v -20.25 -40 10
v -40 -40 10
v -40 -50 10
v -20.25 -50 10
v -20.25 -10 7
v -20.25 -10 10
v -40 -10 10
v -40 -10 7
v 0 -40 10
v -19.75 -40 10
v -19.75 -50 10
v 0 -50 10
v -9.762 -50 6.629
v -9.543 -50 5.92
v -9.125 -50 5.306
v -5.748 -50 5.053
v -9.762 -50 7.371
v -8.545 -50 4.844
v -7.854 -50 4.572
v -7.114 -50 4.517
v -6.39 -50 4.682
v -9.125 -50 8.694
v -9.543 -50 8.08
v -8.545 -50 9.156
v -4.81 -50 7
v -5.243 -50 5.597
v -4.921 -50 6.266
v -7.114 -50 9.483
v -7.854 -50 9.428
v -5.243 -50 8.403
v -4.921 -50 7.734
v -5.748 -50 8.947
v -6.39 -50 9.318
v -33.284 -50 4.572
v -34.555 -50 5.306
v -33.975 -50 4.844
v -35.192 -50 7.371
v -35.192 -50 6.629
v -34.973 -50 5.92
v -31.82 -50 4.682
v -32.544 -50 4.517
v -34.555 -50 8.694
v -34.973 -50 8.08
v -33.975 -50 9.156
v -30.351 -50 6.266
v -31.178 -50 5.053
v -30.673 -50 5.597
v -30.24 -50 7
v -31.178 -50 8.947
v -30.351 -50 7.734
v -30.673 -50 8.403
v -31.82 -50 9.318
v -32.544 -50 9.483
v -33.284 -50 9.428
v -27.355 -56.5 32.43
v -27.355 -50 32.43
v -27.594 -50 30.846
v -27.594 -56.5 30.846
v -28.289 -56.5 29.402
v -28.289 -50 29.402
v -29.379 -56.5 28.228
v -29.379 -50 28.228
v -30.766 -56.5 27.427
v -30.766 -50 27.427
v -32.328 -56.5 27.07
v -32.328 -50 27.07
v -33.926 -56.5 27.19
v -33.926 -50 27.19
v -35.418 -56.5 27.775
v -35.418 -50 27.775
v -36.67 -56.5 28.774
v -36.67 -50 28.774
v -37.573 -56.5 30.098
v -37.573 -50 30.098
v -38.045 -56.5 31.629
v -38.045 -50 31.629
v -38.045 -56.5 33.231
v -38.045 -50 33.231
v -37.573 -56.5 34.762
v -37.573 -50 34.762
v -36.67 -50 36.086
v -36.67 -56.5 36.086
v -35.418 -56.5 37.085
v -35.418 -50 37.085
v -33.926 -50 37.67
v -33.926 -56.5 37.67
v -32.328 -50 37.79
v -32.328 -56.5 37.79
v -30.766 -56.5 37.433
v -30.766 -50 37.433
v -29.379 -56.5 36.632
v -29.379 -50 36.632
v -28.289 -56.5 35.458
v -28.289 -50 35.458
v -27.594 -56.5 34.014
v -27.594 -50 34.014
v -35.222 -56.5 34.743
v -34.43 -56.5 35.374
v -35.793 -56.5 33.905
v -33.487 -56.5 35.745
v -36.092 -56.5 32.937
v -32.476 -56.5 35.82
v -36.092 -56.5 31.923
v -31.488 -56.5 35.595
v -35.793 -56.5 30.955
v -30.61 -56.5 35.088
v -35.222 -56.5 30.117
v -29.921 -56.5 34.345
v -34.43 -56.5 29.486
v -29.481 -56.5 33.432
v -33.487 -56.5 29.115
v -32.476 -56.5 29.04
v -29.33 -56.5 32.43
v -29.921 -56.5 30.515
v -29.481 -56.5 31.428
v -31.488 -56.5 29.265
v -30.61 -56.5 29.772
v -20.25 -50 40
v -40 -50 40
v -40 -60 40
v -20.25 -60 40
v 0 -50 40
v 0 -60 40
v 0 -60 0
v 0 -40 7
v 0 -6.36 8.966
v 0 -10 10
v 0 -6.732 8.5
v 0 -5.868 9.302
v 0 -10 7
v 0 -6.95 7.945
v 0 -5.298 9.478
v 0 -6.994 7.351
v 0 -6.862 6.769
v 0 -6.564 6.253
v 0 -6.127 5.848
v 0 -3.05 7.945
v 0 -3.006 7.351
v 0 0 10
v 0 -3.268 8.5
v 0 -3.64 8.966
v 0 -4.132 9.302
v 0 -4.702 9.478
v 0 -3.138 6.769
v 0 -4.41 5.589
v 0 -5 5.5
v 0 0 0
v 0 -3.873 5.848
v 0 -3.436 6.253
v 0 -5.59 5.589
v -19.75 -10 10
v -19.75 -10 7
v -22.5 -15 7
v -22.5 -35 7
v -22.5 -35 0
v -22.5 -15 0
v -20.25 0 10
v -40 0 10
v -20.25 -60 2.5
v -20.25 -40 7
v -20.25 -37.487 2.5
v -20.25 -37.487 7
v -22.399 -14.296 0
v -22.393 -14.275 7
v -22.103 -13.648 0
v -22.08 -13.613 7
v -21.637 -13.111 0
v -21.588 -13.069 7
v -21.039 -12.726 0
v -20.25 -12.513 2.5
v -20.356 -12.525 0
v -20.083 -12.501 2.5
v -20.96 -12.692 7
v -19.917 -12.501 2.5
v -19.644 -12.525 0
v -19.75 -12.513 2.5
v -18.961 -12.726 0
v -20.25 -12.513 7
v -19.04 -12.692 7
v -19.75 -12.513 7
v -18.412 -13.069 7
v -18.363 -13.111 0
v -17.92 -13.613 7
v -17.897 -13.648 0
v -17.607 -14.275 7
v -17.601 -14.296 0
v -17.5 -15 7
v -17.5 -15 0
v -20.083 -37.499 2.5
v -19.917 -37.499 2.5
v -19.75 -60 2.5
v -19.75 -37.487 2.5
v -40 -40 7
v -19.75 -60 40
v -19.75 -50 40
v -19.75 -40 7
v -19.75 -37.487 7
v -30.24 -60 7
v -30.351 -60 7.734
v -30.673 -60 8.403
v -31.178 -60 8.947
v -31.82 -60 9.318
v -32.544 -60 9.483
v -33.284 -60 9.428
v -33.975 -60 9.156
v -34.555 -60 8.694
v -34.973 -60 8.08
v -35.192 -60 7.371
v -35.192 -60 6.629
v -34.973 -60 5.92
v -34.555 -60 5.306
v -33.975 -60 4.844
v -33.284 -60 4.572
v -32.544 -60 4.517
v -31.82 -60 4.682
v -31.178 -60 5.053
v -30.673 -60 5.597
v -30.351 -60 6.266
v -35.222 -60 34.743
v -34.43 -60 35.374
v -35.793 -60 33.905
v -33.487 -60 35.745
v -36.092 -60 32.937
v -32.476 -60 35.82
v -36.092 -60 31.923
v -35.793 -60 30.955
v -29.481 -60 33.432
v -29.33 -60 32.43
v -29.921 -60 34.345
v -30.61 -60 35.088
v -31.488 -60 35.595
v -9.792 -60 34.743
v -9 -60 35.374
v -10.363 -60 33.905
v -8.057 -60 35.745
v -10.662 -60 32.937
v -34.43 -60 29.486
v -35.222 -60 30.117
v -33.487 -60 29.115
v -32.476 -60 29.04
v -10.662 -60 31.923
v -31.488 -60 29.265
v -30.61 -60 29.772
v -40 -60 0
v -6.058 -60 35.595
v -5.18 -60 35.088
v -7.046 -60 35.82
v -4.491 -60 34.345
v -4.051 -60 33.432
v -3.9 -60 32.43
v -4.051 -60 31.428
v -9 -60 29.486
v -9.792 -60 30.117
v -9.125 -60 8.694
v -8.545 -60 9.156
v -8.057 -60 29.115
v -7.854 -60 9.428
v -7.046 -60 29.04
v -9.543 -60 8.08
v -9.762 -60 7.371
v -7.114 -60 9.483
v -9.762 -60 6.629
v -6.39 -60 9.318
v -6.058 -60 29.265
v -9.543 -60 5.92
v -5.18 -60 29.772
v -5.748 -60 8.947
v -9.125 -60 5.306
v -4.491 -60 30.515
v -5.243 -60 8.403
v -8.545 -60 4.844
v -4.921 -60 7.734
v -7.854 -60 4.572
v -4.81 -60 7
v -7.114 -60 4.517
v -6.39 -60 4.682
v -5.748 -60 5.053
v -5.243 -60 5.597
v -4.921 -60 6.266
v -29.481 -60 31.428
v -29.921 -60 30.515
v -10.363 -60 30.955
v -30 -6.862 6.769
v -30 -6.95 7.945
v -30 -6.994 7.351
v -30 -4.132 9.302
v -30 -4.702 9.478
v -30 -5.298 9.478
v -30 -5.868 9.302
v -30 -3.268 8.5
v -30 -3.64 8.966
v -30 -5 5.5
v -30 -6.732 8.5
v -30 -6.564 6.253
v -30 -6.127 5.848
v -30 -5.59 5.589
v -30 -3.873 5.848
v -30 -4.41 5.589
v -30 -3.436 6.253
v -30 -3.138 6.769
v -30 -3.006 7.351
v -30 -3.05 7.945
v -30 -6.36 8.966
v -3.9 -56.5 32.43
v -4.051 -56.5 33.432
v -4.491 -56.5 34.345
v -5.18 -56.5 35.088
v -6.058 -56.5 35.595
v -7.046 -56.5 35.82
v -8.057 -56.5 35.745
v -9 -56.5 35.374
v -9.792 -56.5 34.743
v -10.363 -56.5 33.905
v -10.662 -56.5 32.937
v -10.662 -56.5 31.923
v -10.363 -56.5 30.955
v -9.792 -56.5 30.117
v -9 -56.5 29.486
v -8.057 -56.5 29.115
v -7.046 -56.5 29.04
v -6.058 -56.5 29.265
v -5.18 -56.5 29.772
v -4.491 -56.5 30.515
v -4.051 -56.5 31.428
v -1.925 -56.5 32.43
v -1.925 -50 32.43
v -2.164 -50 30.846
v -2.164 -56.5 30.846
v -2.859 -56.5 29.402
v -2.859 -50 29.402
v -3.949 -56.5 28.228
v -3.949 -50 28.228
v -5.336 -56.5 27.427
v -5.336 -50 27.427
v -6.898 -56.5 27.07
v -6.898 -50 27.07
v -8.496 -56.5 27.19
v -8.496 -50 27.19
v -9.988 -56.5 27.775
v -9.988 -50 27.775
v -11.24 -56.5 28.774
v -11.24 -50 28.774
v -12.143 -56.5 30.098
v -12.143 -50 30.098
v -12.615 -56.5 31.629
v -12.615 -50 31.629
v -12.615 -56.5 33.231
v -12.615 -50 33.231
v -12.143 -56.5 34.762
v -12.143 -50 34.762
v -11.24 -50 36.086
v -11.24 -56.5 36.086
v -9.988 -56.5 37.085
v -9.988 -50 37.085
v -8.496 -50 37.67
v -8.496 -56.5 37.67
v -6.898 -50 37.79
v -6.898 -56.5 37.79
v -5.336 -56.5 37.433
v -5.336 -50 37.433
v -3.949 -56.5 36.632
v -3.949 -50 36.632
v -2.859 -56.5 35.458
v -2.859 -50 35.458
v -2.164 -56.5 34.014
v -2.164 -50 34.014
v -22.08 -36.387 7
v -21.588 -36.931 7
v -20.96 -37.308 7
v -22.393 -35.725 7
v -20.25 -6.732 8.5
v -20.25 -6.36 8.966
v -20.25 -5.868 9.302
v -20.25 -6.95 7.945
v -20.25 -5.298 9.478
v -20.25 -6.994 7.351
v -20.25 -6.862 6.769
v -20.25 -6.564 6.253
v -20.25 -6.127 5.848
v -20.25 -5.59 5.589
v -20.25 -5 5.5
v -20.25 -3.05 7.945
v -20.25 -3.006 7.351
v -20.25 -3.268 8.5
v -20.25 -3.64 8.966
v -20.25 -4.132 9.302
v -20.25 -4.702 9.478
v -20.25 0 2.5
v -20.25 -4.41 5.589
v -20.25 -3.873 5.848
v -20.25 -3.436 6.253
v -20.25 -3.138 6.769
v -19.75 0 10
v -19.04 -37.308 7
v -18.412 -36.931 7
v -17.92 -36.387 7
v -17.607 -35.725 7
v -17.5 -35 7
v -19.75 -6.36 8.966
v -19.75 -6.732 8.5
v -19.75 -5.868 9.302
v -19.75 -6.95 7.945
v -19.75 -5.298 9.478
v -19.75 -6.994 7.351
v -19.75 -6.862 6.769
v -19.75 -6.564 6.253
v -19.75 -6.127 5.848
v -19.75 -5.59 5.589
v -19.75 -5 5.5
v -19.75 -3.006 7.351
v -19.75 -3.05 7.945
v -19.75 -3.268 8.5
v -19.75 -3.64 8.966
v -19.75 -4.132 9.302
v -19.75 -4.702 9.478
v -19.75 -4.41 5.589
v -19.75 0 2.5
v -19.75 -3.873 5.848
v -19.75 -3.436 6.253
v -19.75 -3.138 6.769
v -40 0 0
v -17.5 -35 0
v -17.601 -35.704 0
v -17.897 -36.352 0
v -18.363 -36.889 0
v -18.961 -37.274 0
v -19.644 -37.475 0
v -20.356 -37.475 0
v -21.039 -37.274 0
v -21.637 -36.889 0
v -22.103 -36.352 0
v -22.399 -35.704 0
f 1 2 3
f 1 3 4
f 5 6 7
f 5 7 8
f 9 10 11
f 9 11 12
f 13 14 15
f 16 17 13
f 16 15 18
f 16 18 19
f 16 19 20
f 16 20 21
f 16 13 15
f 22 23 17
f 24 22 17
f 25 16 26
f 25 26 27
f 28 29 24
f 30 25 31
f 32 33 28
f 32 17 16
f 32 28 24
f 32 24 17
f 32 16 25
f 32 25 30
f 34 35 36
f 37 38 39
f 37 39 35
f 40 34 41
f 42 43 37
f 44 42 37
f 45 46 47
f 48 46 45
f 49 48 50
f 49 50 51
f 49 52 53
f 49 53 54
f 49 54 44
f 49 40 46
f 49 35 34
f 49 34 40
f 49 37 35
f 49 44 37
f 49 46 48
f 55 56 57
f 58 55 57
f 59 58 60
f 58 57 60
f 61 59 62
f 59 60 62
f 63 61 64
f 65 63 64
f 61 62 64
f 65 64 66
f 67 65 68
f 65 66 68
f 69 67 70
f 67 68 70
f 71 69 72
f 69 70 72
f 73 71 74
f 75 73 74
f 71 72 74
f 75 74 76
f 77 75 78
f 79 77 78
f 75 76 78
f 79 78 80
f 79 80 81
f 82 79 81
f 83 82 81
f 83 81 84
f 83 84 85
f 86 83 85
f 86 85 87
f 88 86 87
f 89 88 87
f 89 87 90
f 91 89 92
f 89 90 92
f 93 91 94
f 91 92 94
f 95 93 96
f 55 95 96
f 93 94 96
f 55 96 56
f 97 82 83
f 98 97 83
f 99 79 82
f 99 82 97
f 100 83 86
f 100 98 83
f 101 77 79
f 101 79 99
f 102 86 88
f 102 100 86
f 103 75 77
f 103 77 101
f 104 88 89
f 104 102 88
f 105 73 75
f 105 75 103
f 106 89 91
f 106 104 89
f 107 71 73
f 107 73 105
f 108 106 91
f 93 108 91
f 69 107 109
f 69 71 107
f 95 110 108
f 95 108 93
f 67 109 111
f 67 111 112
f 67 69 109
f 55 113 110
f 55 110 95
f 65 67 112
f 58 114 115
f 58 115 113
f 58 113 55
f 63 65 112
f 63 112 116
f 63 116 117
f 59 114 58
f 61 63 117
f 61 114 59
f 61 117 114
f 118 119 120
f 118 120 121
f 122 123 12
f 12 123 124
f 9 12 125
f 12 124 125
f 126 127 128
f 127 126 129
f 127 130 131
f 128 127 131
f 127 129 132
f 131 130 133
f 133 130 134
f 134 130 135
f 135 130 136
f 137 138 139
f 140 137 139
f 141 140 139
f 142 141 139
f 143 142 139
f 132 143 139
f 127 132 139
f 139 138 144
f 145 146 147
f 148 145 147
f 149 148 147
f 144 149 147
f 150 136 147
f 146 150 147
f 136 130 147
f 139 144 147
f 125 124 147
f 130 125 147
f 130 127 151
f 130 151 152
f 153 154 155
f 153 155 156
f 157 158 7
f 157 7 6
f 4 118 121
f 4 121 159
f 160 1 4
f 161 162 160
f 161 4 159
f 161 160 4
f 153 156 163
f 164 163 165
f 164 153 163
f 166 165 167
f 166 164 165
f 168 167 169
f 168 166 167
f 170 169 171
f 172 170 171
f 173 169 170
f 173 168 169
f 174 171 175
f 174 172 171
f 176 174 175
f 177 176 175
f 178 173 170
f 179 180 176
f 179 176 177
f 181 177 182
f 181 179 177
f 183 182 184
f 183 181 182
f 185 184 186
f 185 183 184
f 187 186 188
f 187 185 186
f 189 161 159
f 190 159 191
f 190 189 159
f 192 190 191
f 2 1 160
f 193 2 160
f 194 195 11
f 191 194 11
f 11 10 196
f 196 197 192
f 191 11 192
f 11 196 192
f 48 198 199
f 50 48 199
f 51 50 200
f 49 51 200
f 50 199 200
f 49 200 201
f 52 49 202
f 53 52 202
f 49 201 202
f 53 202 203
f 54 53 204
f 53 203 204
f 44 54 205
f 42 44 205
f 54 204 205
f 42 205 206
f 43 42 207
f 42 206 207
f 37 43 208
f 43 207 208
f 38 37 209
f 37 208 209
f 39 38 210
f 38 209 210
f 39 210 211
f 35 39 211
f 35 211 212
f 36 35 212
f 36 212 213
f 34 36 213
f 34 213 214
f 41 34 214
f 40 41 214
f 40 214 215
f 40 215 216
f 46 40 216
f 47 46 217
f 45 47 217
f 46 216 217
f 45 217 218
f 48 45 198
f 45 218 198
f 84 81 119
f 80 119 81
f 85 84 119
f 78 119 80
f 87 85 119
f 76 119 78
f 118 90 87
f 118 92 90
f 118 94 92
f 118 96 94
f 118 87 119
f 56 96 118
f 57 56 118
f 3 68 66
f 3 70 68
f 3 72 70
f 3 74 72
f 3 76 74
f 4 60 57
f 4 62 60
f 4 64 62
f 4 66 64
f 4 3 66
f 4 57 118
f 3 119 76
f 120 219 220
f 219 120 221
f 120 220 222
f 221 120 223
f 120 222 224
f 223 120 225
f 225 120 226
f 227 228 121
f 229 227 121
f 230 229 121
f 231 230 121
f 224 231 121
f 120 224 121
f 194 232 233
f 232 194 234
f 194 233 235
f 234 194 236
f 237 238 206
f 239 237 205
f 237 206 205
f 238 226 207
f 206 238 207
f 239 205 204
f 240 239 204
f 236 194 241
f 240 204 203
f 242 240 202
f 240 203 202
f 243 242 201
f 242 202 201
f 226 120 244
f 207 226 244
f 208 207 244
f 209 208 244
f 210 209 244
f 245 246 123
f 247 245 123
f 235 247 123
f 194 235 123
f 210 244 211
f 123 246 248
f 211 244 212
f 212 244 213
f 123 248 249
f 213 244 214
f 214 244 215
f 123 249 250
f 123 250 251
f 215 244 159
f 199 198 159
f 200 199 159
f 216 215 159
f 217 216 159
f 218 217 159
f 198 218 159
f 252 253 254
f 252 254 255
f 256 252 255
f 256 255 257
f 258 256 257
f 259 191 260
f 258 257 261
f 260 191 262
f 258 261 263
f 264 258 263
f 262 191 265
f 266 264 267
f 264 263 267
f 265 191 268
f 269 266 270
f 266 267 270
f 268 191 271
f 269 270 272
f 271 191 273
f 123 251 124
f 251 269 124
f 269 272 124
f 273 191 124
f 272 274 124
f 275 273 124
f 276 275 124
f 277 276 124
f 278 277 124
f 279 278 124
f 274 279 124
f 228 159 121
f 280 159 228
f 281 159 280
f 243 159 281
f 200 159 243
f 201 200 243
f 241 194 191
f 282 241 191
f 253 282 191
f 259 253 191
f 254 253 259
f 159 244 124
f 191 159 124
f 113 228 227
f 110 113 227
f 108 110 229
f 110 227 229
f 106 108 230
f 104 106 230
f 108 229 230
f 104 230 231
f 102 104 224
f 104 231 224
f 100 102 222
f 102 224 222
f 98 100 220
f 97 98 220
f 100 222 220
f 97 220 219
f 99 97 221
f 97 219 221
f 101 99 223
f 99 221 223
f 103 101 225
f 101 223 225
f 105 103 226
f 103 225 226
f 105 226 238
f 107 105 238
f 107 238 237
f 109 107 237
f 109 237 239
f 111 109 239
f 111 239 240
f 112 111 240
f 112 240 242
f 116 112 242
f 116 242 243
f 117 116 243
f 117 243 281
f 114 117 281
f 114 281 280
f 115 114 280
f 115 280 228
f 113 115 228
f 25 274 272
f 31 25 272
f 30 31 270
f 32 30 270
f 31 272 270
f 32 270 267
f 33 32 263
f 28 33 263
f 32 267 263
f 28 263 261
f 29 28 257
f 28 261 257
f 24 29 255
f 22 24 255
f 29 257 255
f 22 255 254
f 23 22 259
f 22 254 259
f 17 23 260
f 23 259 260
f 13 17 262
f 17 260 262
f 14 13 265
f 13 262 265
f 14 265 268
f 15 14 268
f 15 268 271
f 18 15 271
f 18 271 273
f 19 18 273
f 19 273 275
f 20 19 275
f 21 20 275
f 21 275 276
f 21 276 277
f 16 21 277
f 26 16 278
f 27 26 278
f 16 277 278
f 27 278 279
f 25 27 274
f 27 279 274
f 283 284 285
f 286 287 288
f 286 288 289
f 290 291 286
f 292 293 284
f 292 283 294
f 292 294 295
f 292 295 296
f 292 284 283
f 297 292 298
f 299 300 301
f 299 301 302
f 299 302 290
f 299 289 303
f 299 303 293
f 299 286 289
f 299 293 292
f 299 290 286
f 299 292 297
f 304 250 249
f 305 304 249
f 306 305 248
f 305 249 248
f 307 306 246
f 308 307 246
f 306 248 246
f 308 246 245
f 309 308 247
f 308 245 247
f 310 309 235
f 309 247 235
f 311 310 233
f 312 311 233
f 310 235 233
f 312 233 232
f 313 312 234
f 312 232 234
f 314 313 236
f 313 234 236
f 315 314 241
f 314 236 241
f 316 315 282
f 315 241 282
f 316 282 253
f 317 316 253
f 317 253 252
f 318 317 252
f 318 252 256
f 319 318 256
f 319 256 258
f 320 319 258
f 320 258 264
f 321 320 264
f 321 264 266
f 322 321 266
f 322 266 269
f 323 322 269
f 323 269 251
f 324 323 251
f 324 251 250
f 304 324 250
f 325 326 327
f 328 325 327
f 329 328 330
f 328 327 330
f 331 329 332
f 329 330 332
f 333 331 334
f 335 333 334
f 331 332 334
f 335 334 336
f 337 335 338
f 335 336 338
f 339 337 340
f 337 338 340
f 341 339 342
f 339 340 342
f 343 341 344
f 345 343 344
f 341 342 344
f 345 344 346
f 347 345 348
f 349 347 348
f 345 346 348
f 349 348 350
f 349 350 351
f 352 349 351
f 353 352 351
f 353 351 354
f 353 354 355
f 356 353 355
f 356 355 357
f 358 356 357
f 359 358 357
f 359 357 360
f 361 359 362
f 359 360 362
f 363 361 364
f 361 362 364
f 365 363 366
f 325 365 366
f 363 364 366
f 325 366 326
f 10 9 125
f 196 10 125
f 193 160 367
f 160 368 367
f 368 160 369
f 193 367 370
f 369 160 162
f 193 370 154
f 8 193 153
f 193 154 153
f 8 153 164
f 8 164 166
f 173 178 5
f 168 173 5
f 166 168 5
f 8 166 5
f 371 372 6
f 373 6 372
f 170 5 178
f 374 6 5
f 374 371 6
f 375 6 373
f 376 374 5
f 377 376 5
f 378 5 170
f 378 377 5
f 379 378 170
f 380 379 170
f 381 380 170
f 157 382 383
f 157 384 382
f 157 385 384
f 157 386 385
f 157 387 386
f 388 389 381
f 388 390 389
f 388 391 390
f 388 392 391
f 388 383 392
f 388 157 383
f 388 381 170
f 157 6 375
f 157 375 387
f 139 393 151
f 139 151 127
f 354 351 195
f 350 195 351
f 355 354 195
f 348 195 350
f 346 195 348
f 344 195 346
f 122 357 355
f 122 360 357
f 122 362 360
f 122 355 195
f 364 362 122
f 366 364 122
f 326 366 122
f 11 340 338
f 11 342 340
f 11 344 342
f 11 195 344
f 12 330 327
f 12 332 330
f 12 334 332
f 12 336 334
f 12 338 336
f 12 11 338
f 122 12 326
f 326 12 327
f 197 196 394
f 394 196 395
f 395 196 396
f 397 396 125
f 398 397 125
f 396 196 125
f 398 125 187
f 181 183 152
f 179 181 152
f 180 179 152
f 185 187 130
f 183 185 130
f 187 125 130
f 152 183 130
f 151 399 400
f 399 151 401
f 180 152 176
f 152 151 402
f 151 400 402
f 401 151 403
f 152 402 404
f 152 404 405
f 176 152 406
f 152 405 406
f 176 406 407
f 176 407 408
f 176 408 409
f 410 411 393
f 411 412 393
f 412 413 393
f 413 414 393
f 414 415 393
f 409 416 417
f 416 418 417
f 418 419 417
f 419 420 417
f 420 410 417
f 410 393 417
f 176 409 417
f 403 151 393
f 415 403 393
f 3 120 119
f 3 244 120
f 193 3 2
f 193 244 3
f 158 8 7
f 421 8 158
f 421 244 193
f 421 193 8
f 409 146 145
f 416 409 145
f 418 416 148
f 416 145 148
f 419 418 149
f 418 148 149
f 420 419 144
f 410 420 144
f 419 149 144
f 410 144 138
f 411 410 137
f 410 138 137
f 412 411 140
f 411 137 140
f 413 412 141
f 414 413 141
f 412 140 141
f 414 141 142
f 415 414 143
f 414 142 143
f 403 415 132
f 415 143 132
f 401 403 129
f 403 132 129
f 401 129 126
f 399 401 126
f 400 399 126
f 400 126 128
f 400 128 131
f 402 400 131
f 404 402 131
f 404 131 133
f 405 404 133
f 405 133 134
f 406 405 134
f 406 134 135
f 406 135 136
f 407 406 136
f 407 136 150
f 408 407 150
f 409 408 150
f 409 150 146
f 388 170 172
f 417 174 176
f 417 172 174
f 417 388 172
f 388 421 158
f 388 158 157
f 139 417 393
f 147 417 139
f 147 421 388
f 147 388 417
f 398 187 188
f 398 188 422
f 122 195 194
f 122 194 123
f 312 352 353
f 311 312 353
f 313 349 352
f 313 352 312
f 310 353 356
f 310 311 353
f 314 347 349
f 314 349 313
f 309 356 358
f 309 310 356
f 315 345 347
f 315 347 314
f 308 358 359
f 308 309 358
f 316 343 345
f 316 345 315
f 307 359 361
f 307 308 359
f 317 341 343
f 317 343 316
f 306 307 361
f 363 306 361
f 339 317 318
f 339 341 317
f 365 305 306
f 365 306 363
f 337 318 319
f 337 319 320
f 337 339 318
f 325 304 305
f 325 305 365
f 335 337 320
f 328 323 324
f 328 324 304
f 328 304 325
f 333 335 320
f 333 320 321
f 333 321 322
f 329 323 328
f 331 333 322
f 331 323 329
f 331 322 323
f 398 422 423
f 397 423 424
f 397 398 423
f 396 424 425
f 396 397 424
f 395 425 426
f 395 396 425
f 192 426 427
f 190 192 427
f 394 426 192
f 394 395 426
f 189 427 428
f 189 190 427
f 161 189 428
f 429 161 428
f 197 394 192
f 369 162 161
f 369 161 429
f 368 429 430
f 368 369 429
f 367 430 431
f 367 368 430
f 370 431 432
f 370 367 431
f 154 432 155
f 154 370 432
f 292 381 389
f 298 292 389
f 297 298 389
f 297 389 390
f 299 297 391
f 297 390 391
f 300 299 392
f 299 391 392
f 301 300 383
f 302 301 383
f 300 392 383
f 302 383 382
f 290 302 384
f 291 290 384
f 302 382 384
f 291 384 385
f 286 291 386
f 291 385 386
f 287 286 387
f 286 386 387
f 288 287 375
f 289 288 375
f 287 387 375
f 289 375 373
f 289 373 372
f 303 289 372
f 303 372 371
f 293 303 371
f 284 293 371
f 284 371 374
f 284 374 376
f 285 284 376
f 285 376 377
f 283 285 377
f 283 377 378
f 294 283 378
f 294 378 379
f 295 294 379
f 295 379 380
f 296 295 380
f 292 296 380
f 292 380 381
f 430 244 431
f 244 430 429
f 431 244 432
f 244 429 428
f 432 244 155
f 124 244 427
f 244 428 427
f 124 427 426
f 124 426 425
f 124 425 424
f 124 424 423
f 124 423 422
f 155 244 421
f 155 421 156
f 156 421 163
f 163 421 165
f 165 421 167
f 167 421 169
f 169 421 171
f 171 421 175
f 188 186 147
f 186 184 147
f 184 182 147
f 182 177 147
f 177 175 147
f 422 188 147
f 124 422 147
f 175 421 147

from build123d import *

# Parameters (mm, degrees)
SKETCH1_W           = 40
SKETCH1_H           = 60
BOSS_EXTRUDE1_DEPTH = 10
CUT_EXTRUDE1_DEPTH  = 11
SKETCH5_W           = 3
SKETCH5_H           = 30
CUT_EXTRUDE4_DEPTH  = 41
SKETCH6_W           = 40
SKETCH6_H           = 10
BOSS_EXTRUDE2_DEPTH = 30
SKETCH8_W           = 0.5
SKETCH8_H           = 37.5
CUT_EXTRUDE7_DEPTH  = 60
SKETCH10_R          = 2
CUT_EXTRUDE10_DEPTH = 30
SKETCH12_R          = 3.4
SKETCH12_R_2        = 2.49
CUT_EXTRUDE13_DEPTH = 10
SKETCH14_R          = 5.375
CUT_EXTRUDE14_DEPTH = 6.5


with BuildPart() as part:
    # Sketch1 → Boss-Extrude1 (new body)
    with BuildSketch(Plane.XY):
        with Locations((-20, -30)):
            Rectangle(SKETCH1_W, SKETCH1_H)
    extrude(amount=BOSS_EXTRUDE1_DEPTH)

    # Sketch2 → Cut-Extrude1 (cut, through all)
    with BuildSketch(Plane.XY.offset(10)):
        with BuildLine():
            Line((-17.5, -15), (-17.5, -35))
            ThreePointArc((-17.5, -35), (-20, -37.5), (-22.5, -35))
            Line((-22.5, -35), (-22.5, -15))
            ThreePointArc((-22.5, -15), (-20, -12.5), (-17.5, -15))
        make_face()
    extrude(amount=-CUT_EXTRUDE1_DEPTH, mode=Mode.SUBTRACT)

    # Sketch5 → Cut-Extrude4 (cut, through all)
    with BuildSketch(Plane(origin=(0, 0, 0), x_dir=(0, 0, -1), z_dir=(1, 0, 0))):
        with Locations((-8.5, -25)):
            Rectangle(SKETCH5_W, SKETCH5_H)
    extrude(amount=-CUT_EXTRUDE4_DEPTH, mode=Mode.SUBTRACT)

    # Sketch6 → Boss-Extrude2 (add)
    with BuildSketch(Plane.XY.offset(10)):
        with Locations((-20, -55)):
            Rectangle(SKETCH6_W, SKETCH6_H)
    extrude(amount=BOSS_EXTRUDE2_DEPTH)

    # Sketch8 → Cut-Extrude7 (cut)
    with BuildSketch(Plane(origin=(0, 0, 0), x_dir=(1, 0, 0), z_dir=(0, 1, 0))):
        with Locations((-20, -21.25)):
            Rectangle(SKETCH8_W, SKETCH8_H)
    extrude(amount=-CUT_EXTRUDE7_DEPTH, mode=Mode.SUBTRACT)

    # Sketch10 → Cut-Extrude10 (cut)
    with BuildSketch(Plane(origin=(0, 0, 0), x_dir=(0, 0, -1), z_dir=(1, 0, 0))):
        with Locations((-7.5, -5)):
            Circle(SKETCH10_R)
    extrude(amount=-CUT_EXTRUDE10_DEPTH, mode=Mode.SUBTRACT)

    # Sketch12 → Cut-Extrude13 (cut)
    with BuildSketch(Plane.XZ.offset(60)):
        with Locations((-7.3, 32.43)):
            Circle(SKETCH12_R)
        with Locations((-32.73, 32.43)):
            Circle(SKETCH12_R)
        with Locations((-32.73, 7)):
            Circle(SKETCH12_R_2)
        with Locations((-7.3, 7)):
            Circle(SKETCH12_R_2)
    extrude(amount=-CUT_EXTRUDE13_DEPTH, mode=Mode.SUBTRACT)

    # Sketch14 → Cut-Extrude14 (cut)
    with BuildSketch(Plane(origin=(0, -50, 0), x_dir=(1, 0, 0), z_dir=(0, 1, 0))):
        with Locations((-32.73, -32.43)):
            Circle(SKETCH14_R)
        with Locations((-7.3, -32.43)):
            Circle(SKETCH14_R)
    extrude(amount=-CUT_EXTRUDE14_DEPTH, mode=Mode.SUBTRACT)


solid = part.part
